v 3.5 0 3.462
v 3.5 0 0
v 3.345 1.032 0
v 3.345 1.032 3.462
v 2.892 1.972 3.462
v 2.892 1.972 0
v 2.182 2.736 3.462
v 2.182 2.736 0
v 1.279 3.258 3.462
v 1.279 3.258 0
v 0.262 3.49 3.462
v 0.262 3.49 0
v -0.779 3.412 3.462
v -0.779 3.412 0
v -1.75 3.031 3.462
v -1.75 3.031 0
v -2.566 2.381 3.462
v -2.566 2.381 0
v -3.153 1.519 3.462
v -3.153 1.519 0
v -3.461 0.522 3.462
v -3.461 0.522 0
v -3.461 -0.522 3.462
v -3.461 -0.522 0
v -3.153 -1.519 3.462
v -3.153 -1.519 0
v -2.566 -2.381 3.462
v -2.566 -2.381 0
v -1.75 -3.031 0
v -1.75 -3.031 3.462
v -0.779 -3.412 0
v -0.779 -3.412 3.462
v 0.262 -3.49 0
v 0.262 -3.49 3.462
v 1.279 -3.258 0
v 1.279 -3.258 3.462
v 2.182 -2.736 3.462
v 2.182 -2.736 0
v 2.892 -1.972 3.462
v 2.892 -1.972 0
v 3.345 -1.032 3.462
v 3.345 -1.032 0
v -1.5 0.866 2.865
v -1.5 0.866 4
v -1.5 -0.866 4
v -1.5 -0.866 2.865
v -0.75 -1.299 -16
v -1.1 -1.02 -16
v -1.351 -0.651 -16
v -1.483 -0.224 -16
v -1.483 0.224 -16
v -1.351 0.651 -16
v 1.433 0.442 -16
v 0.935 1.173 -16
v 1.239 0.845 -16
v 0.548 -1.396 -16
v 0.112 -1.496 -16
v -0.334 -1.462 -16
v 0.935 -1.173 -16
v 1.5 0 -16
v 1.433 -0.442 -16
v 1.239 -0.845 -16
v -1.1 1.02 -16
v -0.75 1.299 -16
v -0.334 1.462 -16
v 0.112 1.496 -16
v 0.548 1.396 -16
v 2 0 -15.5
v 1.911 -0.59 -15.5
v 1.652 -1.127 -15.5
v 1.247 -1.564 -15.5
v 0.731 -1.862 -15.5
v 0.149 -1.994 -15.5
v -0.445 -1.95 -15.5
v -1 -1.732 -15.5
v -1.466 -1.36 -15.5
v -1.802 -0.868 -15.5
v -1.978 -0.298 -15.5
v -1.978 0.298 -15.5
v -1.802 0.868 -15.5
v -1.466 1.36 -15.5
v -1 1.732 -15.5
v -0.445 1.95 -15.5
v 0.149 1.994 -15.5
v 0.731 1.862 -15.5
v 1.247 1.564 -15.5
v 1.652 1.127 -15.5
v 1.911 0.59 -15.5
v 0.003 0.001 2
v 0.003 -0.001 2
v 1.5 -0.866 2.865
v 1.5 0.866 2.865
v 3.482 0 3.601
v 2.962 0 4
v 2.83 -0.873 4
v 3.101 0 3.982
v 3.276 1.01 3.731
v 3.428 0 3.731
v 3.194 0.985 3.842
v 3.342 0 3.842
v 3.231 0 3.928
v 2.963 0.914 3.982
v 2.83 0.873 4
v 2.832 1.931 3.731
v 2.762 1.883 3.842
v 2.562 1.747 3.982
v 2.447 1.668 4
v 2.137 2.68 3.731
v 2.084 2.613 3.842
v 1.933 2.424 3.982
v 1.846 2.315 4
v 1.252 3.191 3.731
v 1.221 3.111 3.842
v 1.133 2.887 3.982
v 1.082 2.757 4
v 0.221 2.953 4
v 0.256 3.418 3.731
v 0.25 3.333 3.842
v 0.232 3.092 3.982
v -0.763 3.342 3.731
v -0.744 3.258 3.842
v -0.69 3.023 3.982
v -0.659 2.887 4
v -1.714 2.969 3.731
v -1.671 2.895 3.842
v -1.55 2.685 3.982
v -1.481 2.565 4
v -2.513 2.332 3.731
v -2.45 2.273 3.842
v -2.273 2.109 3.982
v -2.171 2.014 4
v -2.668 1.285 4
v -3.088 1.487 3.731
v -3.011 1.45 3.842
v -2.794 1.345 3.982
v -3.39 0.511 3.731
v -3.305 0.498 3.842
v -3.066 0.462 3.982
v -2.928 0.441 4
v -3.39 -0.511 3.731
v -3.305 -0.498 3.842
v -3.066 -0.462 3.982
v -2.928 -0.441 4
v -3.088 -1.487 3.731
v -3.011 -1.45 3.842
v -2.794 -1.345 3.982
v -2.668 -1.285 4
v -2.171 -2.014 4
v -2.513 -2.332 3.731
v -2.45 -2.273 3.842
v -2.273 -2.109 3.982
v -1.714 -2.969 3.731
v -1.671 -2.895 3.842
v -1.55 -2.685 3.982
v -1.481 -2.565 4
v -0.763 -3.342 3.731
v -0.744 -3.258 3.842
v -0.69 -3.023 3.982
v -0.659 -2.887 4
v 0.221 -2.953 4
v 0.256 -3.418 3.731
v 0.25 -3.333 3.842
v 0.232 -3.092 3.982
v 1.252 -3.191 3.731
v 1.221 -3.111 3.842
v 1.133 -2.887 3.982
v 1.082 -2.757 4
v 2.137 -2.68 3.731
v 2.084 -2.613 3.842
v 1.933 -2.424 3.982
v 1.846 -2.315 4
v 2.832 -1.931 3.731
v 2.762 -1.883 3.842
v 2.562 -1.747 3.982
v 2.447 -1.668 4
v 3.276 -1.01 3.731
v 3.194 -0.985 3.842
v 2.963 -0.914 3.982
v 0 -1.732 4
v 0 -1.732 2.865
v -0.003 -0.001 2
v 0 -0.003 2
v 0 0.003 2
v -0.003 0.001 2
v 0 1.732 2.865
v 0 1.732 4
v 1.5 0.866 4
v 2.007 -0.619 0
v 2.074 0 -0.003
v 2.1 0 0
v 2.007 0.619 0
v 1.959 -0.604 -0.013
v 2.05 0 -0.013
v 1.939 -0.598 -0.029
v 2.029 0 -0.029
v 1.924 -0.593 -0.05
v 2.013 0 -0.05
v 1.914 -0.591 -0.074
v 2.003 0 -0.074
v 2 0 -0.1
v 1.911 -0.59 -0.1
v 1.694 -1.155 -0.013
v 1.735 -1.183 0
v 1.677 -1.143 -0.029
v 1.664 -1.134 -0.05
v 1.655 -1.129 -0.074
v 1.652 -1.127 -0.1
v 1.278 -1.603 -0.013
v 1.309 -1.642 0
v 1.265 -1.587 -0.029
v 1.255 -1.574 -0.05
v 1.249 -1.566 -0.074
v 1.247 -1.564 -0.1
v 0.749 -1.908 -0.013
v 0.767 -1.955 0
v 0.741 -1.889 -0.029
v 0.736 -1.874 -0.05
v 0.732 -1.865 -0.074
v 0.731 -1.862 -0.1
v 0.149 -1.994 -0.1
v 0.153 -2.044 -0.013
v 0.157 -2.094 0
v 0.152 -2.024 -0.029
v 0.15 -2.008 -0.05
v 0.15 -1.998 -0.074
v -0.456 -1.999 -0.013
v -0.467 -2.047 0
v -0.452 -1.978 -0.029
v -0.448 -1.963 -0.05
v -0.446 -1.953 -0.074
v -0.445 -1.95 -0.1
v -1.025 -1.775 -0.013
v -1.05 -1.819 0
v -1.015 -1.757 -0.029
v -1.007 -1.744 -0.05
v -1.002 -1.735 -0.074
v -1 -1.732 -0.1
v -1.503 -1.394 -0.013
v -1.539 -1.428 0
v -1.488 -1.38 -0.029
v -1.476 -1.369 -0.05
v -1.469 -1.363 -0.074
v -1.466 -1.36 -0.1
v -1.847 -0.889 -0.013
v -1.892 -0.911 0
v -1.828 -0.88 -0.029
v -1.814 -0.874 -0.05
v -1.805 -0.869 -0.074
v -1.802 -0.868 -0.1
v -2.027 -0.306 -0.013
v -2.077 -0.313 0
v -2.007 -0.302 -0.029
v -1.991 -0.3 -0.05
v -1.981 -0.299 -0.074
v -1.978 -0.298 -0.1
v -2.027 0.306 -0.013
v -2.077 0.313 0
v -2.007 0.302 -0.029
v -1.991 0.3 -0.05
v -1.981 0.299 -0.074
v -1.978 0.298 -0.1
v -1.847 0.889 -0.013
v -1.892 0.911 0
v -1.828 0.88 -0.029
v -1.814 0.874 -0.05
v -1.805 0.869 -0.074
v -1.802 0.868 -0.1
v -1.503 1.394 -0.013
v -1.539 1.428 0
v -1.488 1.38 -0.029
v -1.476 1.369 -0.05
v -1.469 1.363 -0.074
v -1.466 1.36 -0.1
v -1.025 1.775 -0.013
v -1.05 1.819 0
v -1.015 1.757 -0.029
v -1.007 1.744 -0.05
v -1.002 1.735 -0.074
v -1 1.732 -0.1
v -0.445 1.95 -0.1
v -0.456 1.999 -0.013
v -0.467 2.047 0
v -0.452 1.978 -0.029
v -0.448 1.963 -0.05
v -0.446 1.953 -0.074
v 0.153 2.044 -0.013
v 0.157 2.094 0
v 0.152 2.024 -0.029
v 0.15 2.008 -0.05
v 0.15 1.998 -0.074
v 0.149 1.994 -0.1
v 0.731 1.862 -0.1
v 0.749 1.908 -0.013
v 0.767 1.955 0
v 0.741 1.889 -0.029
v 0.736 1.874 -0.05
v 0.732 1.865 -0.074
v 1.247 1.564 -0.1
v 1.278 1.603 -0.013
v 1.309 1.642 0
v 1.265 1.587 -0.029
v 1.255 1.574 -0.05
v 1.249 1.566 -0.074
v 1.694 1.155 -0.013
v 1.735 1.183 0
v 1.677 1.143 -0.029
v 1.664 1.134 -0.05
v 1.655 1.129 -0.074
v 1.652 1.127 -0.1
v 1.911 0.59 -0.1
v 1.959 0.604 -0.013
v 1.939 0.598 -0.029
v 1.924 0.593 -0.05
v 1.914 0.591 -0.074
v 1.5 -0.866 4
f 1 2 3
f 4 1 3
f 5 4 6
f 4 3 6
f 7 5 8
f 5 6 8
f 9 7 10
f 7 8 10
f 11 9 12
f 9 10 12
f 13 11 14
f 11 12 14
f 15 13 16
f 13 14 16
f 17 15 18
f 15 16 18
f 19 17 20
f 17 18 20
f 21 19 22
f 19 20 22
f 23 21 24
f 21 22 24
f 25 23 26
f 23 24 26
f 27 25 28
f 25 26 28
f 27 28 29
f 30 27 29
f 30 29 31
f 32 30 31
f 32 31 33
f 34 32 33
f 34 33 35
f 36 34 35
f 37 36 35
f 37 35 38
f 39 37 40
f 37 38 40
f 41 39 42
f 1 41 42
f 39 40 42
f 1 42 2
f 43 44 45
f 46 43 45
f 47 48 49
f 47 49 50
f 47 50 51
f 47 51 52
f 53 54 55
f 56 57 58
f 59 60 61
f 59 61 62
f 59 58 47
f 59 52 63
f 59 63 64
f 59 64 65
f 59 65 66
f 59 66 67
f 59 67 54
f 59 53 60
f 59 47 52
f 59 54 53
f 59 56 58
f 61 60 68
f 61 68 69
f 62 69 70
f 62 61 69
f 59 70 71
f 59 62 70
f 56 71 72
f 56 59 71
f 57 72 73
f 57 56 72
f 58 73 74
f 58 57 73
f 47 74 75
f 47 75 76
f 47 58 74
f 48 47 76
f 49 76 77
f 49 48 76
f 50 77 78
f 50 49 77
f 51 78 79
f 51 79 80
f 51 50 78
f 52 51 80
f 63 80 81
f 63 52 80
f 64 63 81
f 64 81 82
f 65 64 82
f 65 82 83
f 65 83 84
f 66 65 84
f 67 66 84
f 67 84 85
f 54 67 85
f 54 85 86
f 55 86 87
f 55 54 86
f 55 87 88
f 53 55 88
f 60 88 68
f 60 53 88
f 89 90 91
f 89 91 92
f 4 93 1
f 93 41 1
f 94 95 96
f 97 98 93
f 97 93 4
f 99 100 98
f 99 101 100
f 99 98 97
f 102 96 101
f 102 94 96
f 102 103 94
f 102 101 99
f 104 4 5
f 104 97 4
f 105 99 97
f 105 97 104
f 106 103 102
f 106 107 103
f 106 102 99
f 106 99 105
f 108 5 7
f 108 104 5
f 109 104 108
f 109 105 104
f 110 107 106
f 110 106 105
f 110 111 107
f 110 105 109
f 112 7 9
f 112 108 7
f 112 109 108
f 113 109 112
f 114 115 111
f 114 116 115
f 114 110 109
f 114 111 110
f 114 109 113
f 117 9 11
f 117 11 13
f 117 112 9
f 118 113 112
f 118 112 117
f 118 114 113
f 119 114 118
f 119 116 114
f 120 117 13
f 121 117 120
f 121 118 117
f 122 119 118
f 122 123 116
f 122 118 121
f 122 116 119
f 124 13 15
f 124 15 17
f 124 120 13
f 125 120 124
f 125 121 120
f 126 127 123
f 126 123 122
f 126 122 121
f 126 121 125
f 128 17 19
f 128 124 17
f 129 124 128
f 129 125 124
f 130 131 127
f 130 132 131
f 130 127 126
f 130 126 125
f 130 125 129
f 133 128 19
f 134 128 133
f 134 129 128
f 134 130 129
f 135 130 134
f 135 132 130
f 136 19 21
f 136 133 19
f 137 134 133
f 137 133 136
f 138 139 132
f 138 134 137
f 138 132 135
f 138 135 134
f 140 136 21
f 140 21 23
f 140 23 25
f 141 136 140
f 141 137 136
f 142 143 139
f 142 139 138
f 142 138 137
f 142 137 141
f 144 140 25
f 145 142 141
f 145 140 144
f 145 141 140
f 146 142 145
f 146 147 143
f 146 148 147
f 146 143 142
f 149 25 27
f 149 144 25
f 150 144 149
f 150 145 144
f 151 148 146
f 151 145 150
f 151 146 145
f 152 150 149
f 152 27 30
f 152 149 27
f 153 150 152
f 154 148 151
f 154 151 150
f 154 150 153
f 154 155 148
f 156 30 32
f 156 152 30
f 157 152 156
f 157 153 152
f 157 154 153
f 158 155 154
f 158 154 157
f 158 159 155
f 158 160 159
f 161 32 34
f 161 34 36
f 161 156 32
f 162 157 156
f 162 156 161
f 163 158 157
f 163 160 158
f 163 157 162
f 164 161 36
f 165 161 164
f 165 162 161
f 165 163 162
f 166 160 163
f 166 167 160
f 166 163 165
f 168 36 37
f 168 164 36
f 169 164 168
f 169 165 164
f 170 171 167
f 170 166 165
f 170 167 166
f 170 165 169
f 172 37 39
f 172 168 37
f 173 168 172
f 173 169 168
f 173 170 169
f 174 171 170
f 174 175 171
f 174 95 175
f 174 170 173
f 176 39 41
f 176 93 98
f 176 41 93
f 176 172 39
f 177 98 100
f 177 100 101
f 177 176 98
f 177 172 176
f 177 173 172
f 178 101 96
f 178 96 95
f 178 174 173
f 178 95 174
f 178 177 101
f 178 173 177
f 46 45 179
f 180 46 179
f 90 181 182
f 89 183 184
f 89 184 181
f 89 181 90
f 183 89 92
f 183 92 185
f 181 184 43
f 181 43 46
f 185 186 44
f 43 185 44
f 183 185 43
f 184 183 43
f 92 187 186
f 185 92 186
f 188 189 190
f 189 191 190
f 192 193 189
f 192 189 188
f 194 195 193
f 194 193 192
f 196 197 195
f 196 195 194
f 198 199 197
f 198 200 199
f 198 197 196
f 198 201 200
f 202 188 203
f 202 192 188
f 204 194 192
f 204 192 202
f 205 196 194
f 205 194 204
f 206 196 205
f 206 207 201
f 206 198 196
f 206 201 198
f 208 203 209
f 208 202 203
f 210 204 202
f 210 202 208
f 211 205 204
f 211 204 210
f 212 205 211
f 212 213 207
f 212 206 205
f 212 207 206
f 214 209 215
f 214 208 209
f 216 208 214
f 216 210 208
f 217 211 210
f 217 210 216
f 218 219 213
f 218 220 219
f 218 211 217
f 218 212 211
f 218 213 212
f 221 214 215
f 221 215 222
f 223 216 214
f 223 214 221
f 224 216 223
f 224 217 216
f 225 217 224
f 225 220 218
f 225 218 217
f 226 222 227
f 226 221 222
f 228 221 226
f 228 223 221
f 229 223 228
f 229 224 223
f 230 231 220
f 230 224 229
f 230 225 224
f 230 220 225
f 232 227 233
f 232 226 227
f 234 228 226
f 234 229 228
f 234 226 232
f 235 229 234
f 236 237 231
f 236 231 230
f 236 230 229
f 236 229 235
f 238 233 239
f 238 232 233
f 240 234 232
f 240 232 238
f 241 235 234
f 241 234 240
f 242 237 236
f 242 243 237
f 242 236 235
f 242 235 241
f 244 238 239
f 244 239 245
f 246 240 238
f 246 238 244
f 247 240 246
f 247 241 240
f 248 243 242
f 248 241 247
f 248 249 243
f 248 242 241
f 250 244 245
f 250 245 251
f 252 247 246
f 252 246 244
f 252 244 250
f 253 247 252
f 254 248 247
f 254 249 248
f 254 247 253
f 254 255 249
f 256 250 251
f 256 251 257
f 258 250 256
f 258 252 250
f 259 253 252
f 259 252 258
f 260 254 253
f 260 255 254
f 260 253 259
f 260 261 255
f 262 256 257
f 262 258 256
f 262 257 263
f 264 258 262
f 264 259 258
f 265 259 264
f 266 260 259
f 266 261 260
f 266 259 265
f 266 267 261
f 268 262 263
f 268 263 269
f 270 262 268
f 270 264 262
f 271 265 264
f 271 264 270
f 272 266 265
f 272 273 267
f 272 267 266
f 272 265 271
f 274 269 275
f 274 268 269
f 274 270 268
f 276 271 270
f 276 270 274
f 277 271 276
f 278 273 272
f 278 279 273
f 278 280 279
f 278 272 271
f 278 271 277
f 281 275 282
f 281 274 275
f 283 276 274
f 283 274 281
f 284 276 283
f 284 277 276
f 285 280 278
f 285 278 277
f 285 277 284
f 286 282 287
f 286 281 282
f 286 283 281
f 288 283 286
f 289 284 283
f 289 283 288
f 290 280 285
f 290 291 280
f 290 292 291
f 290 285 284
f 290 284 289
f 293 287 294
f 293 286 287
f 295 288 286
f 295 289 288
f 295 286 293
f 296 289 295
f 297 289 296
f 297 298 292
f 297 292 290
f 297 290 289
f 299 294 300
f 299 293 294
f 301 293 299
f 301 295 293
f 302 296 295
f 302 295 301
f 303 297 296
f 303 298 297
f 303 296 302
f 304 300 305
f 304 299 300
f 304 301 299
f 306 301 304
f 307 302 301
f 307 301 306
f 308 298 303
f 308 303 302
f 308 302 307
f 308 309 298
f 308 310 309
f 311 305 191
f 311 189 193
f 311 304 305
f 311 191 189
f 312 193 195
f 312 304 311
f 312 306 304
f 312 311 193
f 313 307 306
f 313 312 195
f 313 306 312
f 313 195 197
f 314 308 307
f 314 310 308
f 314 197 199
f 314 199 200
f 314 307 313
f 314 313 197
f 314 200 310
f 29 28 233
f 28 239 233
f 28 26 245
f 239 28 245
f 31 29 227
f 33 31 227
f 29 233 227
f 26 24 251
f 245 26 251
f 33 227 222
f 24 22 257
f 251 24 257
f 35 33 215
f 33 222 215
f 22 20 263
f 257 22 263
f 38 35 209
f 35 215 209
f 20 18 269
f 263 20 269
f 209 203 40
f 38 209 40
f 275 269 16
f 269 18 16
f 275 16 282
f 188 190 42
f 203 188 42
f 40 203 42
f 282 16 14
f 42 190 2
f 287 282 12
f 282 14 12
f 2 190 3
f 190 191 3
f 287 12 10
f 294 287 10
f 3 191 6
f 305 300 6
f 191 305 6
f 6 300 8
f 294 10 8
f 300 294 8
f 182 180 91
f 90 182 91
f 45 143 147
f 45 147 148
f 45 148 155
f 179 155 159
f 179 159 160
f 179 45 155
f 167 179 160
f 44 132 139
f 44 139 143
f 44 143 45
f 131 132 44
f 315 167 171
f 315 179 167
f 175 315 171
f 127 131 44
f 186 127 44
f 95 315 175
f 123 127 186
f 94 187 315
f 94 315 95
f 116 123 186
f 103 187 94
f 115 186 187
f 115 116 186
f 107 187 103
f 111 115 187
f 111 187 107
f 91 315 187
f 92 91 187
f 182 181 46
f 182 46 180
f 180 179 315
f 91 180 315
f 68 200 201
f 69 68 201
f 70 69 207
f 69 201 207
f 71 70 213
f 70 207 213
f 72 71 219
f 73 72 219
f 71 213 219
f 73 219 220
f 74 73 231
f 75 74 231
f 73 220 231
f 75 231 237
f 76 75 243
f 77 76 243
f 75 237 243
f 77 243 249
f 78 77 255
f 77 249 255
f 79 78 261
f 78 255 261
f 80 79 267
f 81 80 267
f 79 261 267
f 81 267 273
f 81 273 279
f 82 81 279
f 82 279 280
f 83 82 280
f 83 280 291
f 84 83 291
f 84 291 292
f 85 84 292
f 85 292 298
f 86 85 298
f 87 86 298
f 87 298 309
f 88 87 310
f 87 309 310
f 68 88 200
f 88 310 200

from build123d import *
from OCP.BRepFilletAPI import BRepFilletAPI_MakeChamfer

# Parameters (mm, degrees)
SKETCH_1_R          = 3.5
EXTRUDE_1_DEPTH     = 4
CUT_EXTRUDE_1_DEPTH = 2
SKETCH_3_R          = 2
EXTRUDE_2_DEPTH     = 16
CHAMFER_1_SIZE      = 0.5
FILLET_1_R          = 0.538461538
CHAMFER_2_SIZE      = 0.864553314
CHAMFER_2_SIZE2     = 1.497450266
FILLET_2_R          = 0.1


with BuildPart() as part:
    # 草图1 → 凸台-拉伸1 (new body)
    with BuildSketch(Plane.XY):
        Circle(SKETCH_1_R)
    extrude(amount=EXTRUDE_1_DEPTH)

    # 草图2 → 切除-拉伸1 (cut)
    with BuildSketch(Plane.XY.offset(4)):
        Polygon((1.5, 0.866025404), (0, 1.732050808), (-1.5, 0.866025404), (-1.5, -0.866025404), (0, -1.732050808), (1.5, -0.866025404), align=None)
    extrude(amount=-CUT_EXTRUDE_1_DEPTH, mode=Mode.SUBTRACT)

    # 草图3 → 凸台-拉伸2 (add)
    with BuildSketch(Plane(origin=(0, 0, 0), x_dir=(-1, 0, 0), z_dir=(0, 0, -1))):
        Circle(SKETCH_3_R)
    extrude(amount=EXTRUDE_2_DEPTH)

    # 倒角1
    chamfer_1_edges = [part.edges().sort_by_distance(p)[0] for p in [
        (2, 0, -16),
    ]]
    chamfer(chamfer_1_edges, length=CHAMFER_1_SIZE)

    # 圆角1
    fillet_1_edges = [part.edges().sort_by_distance(p)[0] for p in [
        (-3.5, 0, 4),
    ]]
    fillet(fillet_1_edges, radius=FILLET_1_R)

    # 倒角2: one chamfer whose edges measure the first distance from different faces: ONE call of the kernel's chamfer builder (chamfer() names one face for all edges)
    chamfer_2_edges_1 = [part.edges().sort_by_distance(p)[0] for p in [
        (-1.5, 0, 2),
    ]]
    chamfer_2_side_1 = [part.faces().sort_by_distance(p)[0] for p in [
        (-1.5, 0, 3),
    ]]
    chamfer_2_edges_2 = [part.edges().sort_by_distance(p)[0] for p in [
        (-0.75, 1.299038106, 2),
    ]]
    chamfer_2_side_2 = [part.faces().sort_by_distance(p)[0] for p in [
        (-0.75, 1.299038106, 3),
    ]]
    chamfer_2_edges_3 = [part.edges().sort_by_distance(p)[0] for p in [
        (0.75, 1.299038106, 2),
    ]]
    chamfer_2_side_3 = [part.faces().sort_by_distance(p)[0] for p in [
        (0.75, 1.299038106, 3),
    ]]
    chamfer_2_edges_4 = [part.edges().sort_by_distance(p)[0] for p in [
        (1.5, 0, 2),
    ]]
    chamfer_2_side_4 = [part.faces().sort_by_distance(p)[0] for p in [
        (1.5, 0, 3),
    ]]
    chamfer_2_edges_5 = [part.edges().sort_by_distance(p)[0] for p in [
        (-0.75, -1.299038106, 2),
    ]]
    chamfer_2_side_5 = [part.faces().sort_by_distance(p)[0] for p in [
        (-0.75, -1.299038106, 3),
    ]]
    chamfer_2_edges_6 = [part.edges().sort_by_distance(p)[0] for p in [
        (0.75, -1.299038106, 2),
    ]]
    chamfer_2_side_6 = [part.faces().sort_by_distance(p)[0] for p in [
        (0.75, -1.299038106, 3),
    ]]
    chamfer_2 = BRepFilletAPI_MakeChamfer(part.part.solid().wrapped)
    for e in chamfer_2_edges_1:
        chamfer_2.Add(CHAMFER_2_SIZE, CHAMFER_2_SIZE2, e.wrapped, chamfer_2_side_1[0].wrapped)  # the first distance lies on this face
    for e in chamfer_2_edges_2:
        chamfer_2.Add(CHAMFER_2_SIZE, CHAMFER_2_SIZE2, e.wrapped, chamfer_2_side_2[0].wrapped)  # the first distance lies on this face
    for e in chamfer_2_edges_3:
        chamfer_2.Add(CHAMFER_2_SIZE, CHAMFER_2_SIZE2, e.wrapped, chamfer_2_side_3[0].wrapped)  # the first distance lies on this face
    for e in chamfer_2_edges_4:
        chamfer_2.Add(CHAMFER_2_SIZE, CHAMFER_2_SIZE2, e.wrapped, chamfer_2_side_4[0].wrapped)  # the first distance lies on this face
    for e in chamfer_2_edges_5:
        chamfer_2.Add(CHAMFER_2_SIZE, CHAMFER_2_SIZE2, e.wrapped, chamfer_2_side_5[0].wrapped)  # the first distance lies on this face
    for e in chamfer_2_edges_6:
        chamfer_2.Add(CHAMFER_2_SIZE, CHAMFER_2_SIZE2, e.wrapped, chamfer_2_side_6[0].wrapped)  # the first distance lies on this face
    add(Compound.cast(chamfer_2.Shape()), mode=Mode.REPLACE)

    # 圆角2
    fillet_2_edges = [part.edges().sort_by_distance(p)[0] for p in [
        (2, 0, 0),
    ]]
    fillet(fillet_2_edges, radius=FILLET_2_R)


solid = part.part
